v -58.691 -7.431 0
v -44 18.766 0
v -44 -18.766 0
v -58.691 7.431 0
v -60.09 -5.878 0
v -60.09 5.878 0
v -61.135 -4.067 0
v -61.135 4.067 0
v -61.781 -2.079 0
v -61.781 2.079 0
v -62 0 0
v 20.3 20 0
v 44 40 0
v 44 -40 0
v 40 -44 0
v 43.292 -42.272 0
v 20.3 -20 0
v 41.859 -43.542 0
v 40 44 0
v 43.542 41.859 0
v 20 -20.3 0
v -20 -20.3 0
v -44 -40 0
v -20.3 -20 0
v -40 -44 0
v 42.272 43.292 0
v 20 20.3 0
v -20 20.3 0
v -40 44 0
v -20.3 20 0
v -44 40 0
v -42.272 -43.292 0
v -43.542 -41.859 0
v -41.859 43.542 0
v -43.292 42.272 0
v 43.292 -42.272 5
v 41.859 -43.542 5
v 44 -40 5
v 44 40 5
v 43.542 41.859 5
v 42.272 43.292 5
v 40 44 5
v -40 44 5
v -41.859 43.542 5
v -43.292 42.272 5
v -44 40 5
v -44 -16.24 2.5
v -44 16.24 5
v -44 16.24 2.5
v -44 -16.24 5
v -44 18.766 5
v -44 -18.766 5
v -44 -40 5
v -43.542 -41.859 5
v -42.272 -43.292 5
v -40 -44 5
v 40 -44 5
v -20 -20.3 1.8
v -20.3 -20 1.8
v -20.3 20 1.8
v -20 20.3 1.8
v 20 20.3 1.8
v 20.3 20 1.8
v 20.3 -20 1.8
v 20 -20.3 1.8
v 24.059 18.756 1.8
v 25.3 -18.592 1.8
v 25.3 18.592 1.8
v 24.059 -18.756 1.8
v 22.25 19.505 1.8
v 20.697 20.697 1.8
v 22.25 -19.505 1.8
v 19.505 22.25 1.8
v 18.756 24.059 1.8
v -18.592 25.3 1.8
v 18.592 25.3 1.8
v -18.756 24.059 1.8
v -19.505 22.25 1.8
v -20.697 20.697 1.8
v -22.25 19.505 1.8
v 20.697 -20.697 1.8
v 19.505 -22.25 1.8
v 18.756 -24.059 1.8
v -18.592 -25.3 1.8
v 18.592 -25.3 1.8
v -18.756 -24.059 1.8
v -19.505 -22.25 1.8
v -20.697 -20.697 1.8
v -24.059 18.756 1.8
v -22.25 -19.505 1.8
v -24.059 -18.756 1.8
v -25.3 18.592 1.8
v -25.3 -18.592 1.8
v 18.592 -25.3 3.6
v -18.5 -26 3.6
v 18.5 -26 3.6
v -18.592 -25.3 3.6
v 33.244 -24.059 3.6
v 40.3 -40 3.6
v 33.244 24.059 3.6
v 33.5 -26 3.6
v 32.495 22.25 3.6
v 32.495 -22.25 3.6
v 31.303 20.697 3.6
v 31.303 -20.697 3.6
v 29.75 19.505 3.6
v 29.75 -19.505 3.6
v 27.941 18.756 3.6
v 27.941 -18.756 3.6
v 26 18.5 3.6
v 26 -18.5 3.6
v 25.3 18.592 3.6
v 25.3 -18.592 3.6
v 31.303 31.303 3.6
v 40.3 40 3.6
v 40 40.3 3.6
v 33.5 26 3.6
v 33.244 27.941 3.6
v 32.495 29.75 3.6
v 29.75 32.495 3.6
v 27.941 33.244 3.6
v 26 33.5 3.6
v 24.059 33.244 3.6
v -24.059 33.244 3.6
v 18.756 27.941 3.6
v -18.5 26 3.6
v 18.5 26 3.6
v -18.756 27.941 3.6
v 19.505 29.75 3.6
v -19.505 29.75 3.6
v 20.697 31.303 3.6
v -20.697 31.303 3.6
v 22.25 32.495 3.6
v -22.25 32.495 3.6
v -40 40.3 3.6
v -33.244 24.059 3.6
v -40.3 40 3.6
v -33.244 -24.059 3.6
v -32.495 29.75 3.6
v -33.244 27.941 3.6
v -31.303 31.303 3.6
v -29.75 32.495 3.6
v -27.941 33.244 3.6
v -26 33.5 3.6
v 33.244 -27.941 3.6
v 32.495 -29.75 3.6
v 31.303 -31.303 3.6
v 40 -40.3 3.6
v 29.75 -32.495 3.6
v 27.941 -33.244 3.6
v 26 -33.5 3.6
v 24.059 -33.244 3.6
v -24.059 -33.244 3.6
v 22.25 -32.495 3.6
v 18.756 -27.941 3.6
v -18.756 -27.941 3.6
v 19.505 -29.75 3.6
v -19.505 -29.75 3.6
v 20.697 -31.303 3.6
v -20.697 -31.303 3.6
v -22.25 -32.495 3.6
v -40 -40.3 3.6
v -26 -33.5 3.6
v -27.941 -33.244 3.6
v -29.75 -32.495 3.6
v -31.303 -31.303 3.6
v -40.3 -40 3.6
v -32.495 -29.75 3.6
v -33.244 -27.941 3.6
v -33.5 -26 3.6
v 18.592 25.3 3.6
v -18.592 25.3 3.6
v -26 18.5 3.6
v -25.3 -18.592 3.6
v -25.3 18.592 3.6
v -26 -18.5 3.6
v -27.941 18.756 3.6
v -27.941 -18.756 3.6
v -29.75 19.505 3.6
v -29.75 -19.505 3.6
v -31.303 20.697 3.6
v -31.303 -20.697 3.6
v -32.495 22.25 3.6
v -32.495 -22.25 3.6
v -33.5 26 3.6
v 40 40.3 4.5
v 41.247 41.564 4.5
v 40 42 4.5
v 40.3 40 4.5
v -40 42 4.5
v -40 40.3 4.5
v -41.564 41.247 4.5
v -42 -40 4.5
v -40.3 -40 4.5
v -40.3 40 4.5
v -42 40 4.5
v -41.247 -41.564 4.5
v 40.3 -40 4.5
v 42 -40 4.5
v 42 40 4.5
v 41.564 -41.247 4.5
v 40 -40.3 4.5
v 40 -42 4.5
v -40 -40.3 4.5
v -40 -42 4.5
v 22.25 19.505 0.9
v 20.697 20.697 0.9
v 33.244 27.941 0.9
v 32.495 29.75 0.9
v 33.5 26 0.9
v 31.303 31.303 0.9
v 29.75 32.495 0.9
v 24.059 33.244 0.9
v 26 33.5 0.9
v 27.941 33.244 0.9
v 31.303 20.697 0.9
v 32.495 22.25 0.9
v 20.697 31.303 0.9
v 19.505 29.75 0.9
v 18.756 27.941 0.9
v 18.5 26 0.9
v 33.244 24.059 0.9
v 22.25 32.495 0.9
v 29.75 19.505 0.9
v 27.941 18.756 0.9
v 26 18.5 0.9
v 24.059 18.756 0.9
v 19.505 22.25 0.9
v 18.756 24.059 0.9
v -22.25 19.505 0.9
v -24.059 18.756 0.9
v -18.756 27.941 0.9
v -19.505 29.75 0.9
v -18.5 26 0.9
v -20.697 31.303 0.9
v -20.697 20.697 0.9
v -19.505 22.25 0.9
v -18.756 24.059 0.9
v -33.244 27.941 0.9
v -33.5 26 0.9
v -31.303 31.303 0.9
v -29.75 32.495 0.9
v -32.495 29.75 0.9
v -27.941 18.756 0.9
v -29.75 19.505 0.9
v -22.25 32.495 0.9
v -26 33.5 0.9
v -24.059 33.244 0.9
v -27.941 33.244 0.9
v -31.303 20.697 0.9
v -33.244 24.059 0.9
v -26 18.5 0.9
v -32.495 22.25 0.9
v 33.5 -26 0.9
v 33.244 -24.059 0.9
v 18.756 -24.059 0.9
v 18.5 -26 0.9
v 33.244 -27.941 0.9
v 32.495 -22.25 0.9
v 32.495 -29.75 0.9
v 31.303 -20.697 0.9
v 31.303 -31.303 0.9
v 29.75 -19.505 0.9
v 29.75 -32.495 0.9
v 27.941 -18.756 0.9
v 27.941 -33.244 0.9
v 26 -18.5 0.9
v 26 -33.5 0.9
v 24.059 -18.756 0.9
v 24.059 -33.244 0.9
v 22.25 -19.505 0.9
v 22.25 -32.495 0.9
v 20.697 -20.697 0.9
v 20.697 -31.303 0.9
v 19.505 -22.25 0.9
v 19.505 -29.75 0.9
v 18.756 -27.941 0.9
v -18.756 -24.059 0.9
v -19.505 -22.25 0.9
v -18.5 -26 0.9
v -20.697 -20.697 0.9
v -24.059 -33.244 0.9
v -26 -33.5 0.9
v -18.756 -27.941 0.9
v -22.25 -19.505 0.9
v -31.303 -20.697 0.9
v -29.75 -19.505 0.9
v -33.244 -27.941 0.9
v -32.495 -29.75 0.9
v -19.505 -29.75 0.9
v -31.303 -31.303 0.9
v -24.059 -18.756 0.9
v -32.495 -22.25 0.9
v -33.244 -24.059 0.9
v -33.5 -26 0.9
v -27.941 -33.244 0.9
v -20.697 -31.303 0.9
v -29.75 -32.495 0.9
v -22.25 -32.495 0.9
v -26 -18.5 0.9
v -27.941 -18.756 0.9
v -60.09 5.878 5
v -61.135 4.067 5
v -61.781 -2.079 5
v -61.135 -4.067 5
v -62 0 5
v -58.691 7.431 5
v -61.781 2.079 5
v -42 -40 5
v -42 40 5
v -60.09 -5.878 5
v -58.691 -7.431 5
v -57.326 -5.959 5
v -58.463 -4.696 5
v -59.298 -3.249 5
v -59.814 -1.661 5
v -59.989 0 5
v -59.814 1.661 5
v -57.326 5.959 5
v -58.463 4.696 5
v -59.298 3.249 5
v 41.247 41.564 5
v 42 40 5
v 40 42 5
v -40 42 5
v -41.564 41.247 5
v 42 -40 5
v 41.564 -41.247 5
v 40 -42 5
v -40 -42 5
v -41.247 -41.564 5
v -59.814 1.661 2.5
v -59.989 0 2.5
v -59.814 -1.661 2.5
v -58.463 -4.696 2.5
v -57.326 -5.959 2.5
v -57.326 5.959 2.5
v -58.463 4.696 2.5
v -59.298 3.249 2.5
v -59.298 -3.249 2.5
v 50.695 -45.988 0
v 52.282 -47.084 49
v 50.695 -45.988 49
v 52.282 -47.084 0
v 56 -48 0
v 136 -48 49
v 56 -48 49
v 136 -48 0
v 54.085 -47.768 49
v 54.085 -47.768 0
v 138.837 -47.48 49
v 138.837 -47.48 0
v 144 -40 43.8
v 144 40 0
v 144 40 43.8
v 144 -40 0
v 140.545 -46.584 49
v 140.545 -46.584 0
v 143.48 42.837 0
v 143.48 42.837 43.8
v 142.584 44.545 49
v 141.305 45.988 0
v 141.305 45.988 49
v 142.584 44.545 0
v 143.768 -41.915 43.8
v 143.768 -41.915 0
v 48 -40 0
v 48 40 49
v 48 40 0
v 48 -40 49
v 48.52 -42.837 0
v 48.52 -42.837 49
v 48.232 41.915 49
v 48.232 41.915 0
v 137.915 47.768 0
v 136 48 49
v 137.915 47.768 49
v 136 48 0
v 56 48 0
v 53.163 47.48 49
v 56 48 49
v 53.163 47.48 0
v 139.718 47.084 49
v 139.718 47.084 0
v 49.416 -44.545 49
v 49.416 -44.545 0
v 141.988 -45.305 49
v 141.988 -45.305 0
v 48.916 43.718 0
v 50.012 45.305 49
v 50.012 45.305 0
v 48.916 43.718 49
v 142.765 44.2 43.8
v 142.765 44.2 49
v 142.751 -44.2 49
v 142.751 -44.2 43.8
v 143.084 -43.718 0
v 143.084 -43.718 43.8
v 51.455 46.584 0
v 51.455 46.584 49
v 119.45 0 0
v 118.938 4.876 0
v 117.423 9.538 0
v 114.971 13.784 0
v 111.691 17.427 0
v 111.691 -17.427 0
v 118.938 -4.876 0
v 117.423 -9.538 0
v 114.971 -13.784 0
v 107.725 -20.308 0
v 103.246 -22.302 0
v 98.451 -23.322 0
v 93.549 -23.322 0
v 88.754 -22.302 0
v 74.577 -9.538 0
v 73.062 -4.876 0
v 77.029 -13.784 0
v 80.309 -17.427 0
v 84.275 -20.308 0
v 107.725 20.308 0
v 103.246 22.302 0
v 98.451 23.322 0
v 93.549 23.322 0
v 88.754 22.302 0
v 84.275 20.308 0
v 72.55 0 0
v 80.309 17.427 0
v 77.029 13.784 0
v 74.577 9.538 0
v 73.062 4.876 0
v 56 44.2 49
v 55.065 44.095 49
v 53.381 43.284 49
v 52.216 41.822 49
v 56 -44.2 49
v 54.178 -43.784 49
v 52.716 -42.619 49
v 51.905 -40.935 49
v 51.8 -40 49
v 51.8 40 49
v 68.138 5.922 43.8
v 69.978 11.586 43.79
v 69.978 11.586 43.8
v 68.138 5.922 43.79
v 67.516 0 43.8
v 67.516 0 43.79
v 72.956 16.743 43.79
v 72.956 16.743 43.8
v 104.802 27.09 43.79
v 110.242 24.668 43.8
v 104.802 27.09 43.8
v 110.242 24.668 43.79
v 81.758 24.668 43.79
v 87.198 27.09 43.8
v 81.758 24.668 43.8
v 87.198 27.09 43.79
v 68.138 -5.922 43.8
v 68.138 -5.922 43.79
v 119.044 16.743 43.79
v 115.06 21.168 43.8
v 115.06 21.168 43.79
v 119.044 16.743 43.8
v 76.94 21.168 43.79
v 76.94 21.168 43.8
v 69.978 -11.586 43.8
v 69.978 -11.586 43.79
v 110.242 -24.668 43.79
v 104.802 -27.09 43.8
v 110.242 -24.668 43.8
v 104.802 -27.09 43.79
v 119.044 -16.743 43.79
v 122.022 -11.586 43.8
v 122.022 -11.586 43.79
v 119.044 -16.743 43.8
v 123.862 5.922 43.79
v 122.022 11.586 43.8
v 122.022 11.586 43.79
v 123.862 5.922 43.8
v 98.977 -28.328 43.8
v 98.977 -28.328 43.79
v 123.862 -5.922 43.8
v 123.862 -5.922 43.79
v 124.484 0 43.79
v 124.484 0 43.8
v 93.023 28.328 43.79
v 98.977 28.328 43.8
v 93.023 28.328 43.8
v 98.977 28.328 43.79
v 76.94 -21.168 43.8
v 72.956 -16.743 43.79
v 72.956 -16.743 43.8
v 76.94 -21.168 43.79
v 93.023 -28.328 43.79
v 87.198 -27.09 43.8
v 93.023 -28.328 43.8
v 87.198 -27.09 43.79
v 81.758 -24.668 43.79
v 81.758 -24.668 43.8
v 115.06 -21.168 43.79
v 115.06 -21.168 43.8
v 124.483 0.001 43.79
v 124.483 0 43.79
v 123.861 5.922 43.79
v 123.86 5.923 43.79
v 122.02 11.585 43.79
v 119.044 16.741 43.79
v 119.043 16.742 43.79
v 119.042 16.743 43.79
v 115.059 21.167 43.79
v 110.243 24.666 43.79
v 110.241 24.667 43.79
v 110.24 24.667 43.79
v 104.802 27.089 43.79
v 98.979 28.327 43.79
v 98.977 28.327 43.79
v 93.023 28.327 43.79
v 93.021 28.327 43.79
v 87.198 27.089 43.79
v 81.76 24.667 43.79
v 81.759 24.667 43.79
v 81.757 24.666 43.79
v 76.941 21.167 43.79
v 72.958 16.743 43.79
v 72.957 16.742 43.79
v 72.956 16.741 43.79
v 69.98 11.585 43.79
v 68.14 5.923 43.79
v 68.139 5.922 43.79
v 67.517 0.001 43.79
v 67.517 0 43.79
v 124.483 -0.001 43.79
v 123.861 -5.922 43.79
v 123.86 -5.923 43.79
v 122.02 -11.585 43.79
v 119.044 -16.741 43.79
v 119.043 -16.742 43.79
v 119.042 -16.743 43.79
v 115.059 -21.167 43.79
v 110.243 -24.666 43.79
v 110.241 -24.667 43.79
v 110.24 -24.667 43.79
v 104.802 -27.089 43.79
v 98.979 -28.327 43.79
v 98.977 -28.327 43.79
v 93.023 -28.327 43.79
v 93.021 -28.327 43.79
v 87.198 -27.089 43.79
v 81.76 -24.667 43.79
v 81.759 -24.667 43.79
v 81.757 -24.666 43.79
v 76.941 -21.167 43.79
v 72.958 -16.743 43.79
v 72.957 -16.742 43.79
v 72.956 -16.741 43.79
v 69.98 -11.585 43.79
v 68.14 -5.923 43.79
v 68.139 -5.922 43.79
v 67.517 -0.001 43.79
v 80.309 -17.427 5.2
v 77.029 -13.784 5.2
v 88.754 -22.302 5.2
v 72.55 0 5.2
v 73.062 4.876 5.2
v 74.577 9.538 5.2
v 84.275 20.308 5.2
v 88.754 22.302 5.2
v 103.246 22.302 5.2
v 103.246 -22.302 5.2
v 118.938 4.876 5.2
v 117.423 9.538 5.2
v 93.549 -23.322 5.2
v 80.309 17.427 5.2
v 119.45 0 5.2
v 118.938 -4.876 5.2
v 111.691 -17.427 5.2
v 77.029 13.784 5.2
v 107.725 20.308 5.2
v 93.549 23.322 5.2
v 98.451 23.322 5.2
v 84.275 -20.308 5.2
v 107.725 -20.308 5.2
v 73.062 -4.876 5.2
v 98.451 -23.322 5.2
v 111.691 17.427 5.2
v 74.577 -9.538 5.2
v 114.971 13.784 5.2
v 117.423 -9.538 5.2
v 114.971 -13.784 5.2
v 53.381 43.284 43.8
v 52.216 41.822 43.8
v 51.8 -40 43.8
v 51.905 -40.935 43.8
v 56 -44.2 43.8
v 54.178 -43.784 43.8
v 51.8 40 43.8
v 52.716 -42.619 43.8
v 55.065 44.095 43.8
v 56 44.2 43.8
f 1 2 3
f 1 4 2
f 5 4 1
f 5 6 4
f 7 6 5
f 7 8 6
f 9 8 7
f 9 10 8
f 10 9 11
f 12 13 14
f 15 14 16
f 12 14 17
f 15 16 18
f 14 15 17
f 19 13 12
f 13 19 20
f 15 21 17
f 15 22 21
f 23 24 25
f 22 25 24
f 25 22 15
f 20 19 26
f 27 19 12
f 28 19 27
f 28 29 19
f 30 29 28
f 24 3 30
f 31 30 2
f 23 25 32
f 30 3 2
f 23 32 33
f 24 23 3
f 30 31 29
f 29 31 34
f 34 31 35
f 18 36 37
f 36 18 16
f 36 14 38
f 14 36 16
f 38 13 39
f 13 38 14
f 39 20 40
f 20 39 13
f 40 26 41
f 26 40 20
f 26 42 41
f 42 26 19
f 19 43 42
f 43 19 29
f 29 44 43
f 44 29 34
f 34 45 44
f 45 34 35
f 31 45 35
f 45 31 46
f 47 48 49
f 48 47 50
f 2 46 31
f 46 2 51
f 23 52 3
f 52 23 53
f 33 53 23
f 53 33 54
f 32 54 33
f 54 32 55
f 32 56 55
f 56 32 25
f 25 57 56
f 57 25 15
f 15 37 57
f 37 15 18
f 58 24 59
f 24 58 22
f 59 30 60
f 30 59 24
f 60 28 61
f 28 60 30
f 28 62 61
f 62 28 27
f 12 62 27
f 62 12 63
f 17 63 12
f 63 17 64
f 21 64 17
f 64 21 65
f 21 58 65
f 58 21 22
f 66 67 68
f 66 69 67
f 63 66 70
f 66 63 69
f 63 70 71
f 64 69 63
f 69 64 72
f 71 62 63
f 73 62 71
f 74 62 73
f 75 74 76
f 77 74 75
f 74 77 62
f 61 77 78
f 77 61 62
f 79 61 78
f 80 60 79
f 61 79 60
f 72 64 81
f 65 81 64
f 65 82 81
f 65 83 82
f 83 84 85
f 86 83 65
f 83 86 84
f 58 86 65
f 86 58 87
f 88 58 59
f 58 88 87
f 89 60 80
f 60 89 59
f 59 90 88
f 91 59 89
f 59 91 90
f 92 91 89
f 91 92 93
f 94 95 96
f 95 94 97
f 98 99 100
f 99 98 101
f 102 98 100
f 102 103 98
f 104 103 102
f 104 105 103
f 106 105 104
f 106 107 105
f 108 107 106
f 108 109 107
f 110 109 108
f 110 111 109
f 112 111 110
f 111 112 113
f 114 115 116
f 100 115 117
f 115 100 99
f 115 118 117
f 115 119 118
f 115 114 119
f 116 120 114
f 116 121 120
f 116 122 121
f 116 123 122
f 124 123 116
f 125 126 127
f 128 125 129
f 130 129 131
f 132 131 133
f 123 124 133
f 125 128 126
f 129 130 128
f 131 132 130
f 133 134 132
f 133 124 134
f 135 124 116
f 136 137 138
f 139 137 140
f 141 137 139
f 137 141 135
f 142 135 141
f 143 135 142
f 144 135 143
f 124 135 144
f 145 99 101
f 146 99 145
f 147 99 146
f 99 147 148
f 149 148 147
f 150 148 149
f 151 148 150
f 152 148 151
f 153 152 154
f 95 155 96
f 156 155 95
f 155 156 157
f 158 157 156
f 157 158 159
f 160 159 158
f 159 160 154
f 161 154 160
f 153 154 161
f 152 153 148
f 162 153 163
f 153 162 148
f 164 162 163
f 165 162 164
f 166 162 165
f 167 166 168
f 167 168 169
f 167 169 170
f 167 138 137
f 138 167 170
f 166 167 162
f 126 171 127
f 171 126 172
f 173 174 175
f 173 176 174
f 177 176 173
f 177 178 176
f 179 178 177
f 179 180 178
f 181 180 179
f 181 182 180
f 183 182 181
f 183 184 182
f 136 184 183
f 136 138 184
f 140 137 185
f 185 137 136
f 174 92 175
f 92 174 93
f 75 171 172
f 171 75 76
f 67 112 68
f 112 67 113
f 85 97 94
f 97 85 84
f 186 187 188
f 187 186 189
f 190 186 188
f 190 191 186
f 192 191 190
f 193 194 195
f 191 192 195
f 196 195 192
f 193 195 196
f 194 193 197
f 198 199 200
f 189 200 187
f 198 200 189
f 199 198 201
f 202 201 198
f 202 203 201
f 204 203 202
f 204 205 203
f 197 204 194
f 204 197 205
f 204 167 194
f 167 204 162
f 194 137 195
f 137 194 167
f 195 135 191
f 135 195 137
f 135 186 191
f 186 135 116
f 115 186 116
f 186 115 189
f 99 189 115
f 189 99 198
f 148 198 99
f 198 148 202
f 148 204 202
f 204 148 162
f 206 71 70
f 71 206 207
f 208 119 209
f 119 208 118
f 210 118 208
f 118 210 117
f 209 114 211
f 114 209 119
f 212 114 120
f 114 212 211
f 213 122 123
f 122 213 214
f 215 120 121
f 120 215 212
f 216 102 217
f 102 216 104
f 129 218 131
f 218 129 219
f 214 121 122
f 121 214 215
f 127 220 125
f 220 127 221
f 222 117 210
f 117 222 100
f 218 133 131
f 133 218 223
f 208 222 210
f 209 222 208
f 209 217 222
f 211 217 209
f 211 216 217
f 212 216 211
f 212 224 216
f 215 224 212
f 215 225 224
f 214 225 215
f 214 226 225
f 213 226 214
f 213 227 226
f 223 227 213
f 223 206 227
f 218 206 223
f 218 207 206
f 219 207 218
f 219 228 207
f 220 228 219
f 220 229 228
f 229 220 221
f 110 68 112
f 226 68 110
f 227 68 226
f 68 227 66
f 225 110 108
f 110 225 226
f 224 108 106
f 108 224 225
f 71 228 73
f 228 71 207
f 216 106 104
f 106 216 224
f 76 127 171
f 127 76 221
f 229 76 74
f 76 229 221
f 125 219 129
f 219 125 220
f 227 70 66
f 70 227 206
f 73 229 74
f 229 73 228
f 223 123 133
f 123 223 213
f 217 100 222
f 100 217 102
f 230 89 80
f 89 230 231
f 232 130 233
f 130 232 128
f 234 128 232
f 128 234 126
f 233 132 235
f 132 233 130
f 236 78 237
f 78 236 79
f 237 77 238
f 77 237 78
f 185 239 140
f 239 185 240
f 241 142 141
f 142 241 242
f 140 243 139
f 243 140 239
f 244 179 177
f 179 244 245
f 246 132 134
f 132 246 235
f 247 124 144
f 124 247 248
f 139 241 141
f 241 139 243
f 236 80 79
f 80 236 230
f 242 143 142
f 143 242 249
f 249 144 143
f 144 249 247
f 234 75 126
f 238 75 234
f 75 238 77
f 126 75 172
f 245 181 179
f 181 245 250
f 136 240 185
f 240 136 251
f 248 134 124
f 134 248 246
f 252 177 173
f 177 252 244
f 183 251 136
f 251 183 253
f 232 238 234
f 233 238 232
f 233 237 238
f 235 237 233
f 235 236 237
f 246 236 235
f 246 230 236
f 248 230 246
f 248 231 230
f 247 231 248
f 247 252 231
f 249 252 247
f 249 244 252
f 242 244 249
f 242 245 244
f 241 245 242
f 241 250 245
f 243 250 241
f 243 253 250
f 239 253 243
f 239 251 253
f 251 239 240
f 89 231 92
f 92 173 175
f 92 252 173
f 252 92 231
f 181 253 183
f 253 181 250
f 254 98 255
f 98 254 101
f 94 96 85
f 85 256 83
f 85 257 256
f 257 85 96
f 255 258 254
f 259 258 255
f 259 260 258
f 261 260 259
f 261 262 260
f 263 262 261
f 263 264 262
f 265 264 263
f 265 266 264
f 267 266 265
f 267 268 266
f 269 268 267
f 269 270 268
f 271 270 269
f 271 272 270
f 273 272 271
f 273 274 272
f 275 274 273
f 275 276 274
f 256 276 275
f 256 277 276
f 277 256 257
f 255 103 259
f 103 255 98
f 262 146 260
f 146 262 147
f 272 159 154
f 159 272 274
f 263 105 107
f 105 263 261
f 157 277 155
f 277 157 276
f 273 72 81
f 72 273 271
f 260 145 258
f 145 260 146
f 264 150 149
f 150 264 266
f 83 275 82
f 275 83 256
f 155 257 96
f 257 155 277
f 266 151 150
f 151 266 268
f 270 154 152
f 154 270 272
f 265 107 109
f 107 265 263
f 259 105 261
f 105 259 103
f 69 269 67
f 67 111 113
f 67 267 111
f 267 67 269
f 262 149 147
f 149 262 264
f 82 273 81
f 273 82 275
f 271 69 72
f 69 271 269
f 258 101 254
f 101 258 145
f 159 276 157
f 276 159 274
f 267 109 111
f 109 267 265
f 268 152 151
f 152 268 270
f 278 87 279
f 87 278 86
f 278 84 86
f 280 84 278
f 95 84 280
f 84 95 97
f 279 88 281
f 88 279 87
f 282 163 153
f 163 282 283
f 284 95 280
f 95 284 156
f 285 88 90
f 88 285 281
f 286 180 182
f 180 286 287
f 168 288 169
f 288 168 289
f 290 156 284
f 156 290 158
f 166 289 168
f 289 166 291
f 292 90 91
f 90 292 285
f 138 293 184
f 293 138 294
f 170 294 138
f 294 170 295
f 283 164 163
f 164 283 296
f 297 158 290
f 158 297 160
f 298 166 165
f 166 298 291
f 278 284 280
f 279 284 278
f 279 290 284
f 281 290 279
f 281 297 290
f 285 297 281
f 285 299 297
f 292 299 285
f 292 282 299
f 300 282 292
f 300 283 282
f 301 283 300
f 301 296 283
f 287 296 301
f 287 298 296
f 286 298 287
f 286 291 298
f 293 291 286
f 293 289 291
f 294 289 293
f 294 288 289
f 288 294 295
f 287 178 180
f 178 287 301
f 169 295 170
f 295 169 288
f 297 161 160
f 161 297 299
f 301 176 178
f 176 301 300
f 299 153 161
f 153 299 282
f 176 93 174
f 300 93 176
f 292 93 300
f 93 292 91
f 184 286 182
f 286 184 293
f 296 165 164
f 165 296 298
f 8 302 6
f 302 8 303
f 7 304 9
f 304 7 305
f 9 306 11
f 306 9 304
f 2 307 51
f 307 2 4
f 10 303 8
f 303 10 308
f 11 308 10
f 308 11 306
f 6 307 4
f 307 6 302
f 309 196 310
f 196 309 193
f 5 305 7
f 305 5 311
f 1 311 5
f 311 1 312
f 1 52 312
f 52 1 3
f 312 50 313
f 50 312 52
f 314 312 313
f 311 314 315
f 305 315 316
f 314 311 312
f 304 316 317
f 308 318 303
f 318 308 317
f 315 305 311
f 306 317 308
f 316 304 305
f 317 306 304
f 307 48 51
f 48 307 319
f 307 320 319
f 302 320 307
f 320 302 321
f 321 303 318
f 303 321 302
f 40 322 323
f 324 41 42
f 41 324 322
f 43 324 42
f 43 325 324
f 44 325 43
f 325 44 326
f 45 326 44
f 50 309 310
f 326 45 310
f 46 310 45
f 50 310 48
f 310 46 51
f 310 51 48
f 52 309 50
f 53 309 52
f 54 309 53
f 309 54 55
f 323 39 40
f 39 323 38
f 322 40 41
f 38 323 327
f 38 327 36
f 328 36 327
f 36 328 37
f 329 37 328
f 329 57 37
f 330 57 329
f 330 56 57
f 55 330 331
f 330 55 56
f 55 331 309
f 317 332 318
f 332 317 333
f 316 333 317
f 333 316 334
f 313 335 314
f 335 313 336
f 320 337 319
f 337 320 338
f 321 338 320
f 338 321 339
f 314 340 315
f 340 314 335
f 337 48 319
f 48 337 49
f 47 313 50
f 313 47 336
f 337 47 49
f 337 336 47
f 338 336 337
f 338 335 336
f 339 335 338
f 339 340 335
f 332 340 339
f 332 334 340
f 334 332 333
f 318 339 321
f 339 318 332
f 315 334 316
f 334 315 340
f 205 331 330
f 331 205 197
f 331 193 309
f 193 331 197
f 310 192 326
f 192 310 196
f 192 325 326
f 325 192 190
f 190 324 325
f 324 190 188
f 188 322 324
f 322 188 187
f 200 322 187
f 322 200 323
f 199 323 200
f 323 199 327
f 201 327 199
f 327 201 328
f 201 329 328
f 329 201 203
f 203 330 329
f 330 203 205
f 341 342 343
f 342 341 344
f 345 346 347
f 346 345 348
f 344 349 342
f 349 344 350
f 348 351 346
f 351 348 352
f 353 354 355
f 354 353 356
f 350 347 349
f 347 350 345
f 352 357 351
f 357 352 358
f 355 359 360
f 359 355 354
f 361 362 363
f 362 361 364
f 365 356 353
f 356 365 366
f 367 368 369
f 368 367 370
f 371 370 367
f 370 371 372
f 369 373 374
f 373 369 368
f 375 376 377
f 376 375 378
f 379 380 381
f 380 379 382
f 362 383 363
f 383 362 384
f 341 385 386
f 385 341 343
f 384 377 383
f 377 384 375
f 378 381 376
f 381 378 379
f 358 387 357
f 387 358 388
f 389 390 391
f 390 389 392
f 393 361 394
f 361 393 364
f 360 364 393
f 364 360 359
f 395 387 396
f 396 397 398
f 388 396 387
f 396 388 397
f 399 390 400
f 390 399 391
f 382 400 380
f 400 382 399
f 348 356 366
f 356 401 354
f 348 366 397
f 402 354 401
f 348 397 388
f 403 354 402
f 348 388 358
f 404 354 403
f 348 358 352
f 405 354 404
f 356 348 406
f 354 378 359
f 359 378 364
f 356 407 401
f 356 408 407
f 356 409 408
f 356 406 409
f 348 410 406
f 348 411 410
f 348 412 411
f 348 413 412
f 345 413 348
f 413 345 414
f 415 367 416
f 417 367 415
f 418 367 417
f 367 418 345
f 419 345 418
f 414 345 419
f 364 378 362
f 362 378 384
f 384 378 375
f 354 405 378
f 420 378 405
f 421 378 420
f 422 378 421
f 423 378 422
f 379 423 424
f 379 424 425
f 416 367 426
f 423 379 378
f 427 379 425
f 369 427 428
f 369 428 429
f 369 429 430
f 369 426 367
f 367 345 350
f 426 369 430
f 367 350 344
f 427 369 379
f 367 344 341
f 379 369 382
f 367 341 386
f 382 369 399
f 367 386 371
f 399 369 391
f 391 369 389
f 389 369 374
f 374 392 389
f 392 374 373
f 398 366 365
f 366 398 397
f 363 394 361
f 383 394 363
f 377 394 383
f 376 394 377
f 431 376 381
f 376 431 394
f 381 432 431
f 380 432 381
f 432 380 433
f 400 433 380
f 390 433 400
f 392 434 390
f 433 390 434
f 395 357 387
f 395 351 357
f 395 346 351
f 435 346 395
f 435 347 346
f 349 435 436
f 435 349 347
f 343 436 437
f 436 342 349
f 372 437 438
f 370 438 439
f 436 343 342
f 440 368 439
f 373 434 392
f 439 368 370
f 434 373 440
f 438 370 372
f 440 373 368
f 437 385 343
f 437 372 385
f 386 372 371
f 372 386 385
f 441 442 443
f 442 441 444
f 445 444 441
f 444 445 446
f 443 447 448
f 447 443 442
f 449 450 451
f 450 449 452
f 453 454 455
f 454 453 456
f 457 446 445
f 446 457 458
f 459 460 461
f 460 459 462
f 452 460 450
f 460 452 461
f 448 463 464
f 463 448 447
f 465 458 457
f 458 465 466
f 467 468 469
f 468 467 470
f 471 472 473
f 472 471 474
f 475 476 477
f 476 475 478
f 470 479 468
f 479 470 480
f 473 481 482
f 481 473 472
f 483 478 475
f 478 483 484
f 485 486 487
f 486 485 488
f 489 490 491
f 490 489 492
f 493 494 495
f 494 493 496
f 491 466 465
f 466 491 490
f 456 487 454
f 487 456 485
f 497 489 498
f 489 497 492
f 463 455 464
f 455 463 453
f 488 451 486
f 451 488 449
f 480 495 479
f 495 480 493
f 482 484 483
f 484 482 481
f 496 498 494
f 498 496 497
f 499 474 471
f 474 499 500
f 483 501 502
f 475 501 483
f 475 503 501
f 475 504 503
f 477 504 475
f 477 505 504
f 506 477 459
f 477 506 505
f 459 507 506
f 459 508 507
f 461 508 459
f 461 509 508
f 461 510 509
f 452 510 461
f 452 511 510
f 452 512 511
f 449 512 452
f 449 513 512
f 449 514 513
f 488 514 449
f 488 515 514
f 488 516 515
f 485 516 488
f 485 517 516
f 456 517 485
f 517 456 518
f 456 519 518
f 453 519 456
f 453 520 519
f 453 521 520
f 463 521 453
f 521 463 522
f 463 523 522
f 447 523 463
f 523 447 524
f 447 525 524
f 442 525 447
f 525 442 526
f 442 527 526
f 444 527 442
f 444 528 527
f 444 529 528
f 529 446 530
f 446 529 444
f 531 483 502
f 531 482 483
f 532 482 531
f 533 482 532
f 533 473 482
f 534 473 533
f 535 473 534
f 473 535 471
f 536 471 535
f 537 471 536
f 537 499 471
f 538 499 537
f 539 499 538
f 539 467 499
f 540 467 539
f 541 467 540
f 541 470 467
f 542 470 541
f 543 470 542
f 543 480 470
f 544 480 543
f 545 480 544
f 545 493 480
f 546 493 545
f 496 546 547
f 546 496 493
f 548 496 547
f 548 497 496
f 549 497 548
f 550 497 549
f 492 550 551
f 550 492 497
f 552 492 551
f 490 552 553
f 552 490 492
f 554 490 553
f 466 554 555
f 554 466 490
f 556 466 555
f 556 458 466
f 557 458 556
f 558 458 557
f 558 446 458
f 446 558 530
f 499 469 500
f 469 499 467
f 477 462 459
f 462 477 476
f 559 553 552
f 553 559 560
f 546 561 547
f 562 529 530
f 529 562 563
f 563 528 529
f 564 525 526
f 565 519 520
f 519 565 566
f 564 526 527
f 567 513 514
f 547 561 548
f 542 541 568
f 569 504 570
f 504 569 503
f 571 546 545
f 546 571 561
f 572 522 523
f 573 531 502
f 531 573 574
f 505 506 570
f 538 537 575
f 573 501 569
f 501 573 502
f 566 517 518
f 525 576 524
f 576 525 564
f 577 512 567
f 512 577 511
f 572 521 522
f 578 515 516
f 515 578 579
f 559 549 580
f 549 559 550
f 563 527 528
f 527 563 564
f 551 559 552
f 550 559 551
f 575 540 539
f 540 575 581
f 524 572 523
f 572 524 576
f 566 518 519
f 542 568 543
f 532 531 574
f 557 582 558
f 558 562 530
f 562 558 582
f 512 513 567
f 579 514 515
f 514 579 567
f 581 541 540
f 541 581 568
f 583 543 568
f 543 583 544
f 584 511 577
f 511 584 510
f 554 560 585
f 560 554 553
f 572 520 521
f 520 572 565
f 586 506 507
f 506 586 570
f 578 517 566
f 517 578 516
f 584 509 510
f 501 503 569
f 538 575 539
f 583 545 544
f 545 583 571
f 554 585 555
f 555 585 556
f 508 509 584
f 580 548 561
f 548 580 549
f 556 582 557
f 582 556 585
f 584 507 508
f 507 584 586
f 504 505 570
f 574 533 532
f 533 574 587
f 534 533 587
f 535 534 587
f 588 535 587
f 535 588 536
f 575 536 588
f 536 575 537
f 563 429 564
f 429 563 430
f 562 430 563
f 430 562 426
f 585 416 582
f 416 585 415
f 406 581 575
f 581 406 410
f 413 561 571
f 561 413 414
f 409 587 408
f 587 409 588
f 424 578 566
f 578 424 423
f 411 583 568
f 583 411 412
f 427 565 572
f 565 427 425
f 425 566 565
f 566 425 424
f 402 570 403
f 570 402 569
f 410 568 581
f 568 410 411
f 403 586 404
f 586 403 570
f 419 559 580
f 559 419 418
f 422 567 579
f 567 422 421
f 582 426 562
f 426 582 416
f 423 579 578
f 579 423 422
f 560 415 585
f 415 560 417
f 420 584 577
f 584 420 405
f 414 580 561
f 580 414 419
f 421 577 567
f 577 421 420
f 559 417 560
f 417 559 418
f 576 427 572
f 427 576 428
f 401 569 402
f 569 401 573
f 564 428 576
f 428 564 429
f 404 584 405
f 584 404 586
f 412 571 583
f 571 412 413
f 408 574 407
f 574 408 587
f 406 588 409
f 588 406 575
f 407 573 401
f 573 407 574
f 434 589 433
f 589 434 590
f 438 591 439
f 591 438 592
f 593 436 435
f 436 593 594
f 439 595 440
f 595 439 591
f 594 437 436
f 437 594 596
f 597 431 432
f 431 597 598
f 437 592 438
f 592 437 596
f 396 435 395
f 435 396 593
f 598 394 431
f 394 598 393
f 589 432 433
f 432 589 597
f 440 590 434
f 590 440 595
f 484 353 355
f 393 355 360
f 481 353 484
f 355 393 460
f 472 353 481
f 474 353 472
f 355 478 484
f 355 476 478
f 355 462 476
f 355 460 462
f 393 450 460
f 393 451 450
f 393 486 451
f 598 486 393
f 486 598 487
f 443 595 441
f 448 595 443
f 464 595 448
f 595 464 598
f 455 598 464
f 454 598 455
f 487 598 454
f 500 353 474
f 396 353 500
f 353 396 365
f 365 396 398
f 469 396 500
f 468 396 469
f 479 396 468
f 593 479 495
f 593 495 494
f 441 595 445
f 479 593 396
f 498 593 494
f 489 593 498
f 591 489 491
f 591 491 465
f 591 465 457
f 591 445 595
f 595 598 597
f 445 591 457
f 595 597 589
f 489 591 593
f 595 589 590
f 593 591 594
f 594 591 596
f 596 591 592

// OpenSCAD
// Parts for photographic slide digitizer
// Adrian McCarthy 2025-06-18
// Based on a more general photo digitizer collaboration with Jason Adler.

function cumulative_sum(layers) = [
  for (i = 0, h = 0; i < len(layers); h = h + layers[i], i = i+1) h
];

function inch(x) = 25.4 * x;

layers = [
    [40, 40, 0.9], // accommodates 127 aperture
    [40, 40, 0.9], // duplicated for easier extraction
    [50, 50, 1.8], // 2"x2" slide mount
    [80, 80, 0.9]
];
  
// TODO:  Is the depth of the pocket for the slides enough to handle both
// GEPE and Wess Plastics slide mounts?
  
w = max([for (layer=layers) layer.x]);
h = max([for (layer=layers) layer.y]);
lift = cumulative_sum([for (layer=layers) layer.z]);
total_lift = lift[len(lift)-1] + layers[len(layers)-1].z;

border = 4;
rim_h = max(5, total_lift);
rim_th = 2;
frame_th = 2;
frame_h = 160;

// Right now, I'm using an old Lumix "travel zoom" camera.  It has a flat
// face except for a circular ring around the lens, which gives us a way to
// align the camera's optical center to that of the slide.
lumix_d = 46.5;  // circular bit surrounding the lens on the pink Lumix camera

// We want to hold the camera as close to the slide as possible in order to
// capture the entire image frame and to be within the focus range of the
// camera (which has some macro capability, but not a lot).  In all instances,
// we'll assume the camera is zoomed all the way out.  Note that you can also
// set the aspect ratio captured by the Lumix.  In both cases, the limit factor
// is the ability to focus up close.  But that point varies with the selected
// aspect ratio, so it's worth have different box heights for different slide
// formats.
lumix40_h = 62;  // 40x40mm frame using Lumix's 1:1 aspect ratio.
lumix35_h = 49;  // ~35x24mm frame using 3:2 aspect ratio.  Too close for 4:3.

// Note, either the whole thing needs to be adjustable, or a separate box
// with a shorter height would be desirable to take full advantage of the
// camera's resolution when digitizing standard 35mm slides.

// TODO:  Figure out a way to restrict rotation of the camera.

box_d1 = max(lumix_d, sqrt(layers[0].x*layers[0].x + layers[0].y*layers[0].y));
box_d2 = lumix_d;
box_h = lumix35_h;  //lumix40_h;

module rim(nozzle_d=0.4) {
    linear_extrude(rim_h) difference() {
        offset(r=border) square([w, h], center=true);
        offset(r=border-rim_th) square([w, h], center=true);
    }
}

module tab(nozzle_d=0.4) {
    d = 20;
    module tab_footprint() {
        hull() {
            translate([-d/2, 0]) circle(d=d);
            translate([-nozzle_d/2, 0]) square([nozzle_d, 2*d], center=true);
        }
    }

    difference() {
        linear_extrude(rim_h) tab_footprint();
        translate([0, 0, 0.5*rim_h])
            linear_extrude(rim_h) offset(r=-rim_th) tab_footprint();
    }
}

module photo_plate(clearance=undef, nozzle_d=0.4) {
    c = is_undef(clearance) ? nozzle_d/2 : clearance;
    difference() {
        for (i = [0:len(layers)-1]) {
            translate([0, 0, lift[i]]) {
                linear_extrude(layers[i].z) {
                    difference() {
                        offset(r=border) square([w, h], center=true);
                        offset(r=c) square([layers[i].x, layers[i].y], center=true);
                    }
                }
            }
        }
        
        // Recesses at the corners make it easy to remove a slide.  They
        // also keep the corners from getting too tight because of printing
        // imperfections.
        translate([ 26,  26, lift[1]]) cylinder(h=total_lift+2, d=15);
        translate([-26,  26, lift[1]]) cylinder(h=total_lift+2, d=15);
        translate([ 26, -26, lift[1]]) cylinder(h=total_lift+2, d=15);
        translate([-26, -26, lift[1]]) cylinder(h=total_lift+2, d=15);
    }
    rim(nozzle_d=nozzle_d);
    translate([-w/2-(border-rim_th), 0]) tab(nozzle_d=nozzle_d);
}

module box(clearance=undef, nozzle_d=0.4) {
    c = is_undef(clearance) ? nozzle_d/2 : clearance;
    h1 = rim_h + c;
    h2 = box_h - 2*(rim_h + c);
    h3 = rim_h;
    z0 = 0;
    z1 = z0 + h1;
    z2 = z1 + h2;
    d1 = box_d1 + 2*c;
    d2 = box_d2 + 2*c;
    difference() {
        linear_extrude(box_h, convexity=4) {
            offset(r=2*border) square([w, h], center=true);
        }
        translate([0, 0, z0-1]) cylinder(h=h1+1.01, d=d1);
        translate([0, 0, z1  ]) cylinder(h=h2,      d1=d1, d2=d2);
        translate([0, 0, z2-1]) cylinder(h=h3+2, d=d2);
        translate([0, 0, z0-1]) linear_extrude(h1+1, convexity=4) hull() {
            offset(r=border+c) square([w, h], center=true);
            translate([-w, 0]) offset(r=border+c) square([w, h], center=true);
        }
    }
}

// The slides are nominally 50x50mm.  The cardboard mounts are typically
// a smidge smaller than that, and we want a snug fit.  But there are
// small variations in the mounts from batch to batch, so we apply a
// clearance that's a little more than the default we'd use just for
// printer tolerance.
slide_clearance = 0.3;  // maybe even 0.4?

echo(w);

if ($preview) {
    color("orange") translate([0, 0, 0.1]) photo_plate(clearance=slide_clearance);
    color("yellow") box();
} else {
    photo_plate(clearance=slide_clearance);
    translate([w+4*border, 0, box_h]) rotate([0, 180, 0]) box();
}
